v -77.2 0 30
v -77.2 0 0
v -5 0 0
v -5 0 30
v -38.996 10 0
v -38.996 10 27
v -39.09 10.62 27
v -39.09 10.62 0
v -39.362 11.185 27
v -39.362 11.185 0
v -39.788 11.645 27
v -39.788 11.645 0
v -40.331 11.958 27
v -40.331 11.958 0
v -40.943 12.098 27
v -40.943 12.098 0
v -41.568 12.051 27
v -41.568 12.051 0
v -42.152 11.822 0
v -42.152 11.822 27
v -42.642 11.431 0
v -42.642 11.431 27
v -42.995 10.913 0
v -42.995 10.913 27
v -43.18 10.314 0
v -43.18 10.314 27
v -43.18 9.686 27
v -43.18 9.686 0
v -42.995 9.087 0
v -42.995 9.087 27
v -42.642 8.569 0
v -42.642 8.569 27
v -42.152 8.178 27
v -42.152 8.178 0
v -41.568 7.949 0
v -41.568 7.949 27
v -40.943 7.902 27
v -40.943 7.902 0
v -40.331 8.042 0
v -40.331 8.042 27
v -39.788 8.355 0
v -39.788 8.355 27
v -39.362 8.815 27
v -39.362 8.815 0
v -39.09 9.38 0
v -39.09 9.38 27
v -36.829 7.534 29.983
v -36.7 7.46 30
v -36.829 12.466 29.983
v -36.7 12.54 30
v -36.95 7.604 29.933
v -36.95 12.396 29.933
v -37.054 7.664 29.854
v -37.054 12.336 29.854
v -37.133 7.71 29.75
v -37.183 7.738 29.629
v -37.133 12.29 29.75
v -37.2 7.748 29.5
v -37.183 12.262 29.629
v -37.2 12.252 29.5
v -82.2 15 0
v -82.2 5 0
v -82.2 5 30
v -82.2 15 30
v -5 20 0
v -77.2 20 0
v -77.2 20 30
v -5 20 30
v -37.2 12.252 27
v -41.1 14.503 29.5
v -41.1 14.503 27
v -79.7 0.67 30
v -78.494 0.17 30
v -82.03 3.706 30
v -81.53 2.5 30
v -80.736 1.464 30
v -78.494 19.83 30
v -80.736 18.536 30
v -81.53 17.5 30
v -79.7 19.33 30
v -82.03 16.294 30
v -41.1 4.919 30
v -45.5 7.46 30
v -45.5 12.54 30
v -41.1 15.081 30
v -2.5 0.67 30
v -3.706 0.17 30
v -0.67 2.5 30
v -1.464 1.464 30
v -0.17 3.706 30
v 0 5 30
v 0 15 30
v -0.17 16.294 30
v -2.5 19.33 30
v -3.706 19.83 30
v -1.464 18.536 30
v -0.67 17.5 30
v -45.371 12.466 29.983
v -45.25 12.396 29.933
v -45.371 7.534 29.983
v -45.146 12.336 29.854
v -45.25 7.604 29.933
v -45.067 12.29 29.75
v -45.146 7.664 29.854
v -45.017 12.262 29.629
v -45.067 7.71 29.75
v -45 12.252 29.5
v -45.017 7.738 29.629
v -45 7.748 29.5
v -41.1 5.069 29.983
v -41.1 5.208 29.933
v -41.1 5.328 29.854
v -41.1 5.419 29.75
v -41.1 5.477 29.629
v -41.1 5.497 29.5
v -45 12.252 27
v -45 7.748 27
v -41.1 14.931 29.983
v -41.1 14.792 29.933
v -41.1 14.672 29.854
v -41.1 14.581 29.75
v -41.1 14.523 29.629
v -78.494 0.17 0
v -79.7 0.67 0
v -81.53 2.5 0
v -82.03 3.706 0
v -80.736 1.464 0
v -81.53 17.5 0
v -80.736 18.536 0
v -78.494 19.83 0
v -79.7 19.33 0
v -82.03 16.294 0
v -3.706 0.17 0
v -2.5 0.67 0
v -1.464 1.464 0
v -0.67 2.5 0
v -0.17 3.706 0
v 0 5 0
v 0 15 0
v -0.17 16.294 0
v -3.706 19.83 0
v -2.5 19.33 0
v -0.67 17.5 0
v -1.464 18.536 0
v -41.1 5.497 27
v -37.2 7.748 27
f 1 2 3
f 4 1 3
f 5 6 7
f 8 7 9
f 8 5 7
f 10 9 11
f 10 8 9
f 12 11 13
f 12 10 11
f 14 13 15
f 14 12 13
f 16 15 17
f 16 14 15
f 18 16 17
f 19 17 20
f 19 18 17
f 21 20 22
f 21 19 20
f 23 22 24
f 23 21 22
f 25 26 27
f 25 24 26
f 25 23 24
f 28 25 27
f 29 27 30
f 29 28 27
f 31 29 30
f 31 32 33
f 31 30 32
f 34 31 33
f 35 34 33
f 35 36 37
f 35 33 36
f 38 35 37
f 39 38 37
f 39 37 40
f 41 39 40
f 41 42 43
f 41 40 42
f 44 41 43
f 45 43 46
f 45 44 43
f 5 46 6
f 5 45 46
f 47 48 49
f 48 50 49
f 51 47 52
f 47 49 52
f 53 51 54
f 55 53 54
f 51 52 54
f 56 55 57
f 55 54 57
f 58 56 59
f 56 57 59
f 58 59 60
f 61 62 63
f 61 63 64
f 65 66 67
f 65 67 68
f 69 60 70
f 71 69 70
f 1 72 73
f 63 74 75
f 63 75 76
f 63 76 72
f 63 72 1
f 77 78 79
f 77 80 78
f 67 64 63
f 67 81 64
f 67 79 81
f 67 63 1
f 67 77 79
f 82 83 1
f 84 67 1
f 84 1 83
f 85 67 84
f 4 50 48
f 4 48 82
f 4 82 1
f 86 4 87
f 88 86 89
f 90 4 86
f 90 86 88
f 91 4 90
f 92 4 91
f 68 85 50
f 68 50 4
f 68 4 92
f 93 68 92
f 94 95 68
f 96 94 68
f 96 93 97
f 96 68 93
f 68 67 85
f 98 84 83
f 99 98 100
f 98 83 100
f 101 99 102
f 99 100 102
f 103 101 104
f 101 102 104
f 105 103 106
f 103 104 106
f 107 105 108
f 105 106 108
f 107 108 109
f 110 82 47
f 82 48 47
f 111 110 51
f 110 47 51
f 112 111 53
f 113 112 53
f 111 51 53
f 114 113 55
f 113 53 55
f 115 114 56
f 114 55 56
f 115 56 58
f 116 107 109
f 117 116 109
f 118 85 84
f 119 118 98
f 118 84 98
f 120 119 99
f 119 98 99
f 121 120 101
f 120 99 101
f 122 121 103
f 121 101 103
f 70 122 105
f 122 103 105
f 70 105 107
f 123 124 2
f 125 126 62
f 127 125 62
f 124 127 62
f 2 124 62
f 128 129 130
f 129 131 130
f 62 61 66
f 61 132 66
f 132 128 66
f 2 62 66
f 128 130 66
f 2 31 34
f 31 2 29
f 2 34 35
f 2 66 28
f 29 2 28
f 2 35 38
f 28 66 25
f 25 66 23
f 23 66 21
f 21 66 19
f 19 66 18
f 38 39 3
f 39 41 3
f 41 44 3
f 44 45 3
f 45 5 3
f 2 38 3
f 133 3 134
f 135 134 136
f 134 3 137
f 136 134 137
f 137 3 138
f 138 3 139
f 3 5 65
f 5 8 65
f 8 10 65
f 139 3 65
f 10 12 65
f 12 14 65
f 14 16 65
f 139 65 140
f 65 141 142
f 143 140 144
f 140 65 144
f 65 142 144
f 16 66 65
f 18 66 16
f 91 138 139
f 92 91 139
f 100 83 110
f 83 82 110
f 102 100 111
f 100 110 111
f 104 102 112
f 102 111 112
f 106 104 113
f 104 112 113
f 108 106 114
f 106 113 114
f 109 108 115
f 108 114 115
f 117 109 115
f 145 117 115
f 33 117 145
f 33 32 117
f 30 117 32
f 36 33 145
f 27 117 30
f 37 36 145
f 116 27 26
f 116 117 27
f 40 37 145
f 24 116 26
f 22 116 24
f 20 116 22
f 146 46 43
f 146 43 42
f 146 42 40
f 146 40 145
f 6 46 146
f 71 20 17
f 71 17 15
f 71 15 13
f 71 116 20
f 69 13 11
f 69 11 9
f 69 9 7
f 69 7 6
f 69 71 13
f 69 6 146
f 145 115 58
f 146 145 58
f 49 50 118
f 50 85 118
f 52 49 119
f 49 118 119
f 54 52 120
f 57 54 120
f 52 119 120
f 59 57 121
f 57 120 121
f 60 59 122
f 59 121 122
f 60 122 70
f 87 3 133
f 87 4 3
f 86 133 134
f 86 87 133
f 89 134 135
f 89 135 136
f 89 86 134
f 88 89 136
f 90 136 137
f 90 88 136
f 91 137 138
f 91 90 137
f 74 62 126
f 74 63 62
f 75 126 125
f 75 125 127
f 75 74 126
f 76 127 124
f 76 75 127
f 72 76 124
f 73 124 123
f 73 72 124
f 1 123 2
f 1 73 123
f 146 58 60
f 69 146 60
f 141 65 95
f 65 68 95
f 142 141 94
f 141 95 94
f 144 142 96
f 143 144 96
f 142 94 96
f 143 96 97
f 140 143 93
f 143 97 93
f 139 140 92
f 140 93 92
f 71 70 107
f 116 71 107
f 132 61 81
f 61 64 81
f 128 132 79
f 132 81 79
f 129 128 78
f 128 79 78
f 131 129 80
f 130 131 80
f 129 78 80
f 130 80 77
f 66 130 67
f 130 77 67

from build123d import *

# Parameters (mm, degrees)
ESQUISSE1_W             = 82.2
ESQUISSE1_H             = 20
BOSS_EXTRU_1_DEPTH      = 30
ENL_V_MAT_EXTRU_1_DEPTH = 3
CONG_1_R                = 5
CONG_2_R                = 0.5
ESQUISSE8_R             = 2.103774153
ENL_V_MAT_EXTRU_3_DEPTH = 90.759901961


with BuildPart() as part:
    # Esquisse1 → Boss.-Extru.1 (new body)
    with BuildSketch(Plane.XY):
        with Locations((-41.1, 10)):
            Rectangle(ESQUISSE1_W, ESQUISSE1_H)
    extrude(amount=BOSS_EXTRU_1_DEPTH)

    # Esquisse2 → Enlèv. mat.-Extru.1 (cut)
    with BuildSketch(Plane.XY.offset(30)):
        Polygon((-41.1, 5.4966679), (-37.2, 7.74833395), (-37.2, 12.25166605), (-41.1, 14.5033321), (-45, 12.25166605), (-45, 7.74833395), align=None)
    extrude(amount=-ENL_V_MAT_EXTRU_1_DEPTH, mode=Mode.SUBTRACT)

    # Congé1
    cong_1_edges = [part.edges().sort_by_distance(p)[0] for p in [
        (0, 0, 15),
        (-82.2, 0, 15),
        (-82.2, 20, 15),
        (0, 20, 15),
    ]]
    fillet(cong_1_edges, radius=CONG_1_R)

    # Congé2
    cong_2_edges = [part.edges().sort_by_distance(p)[0] for p in [
        (-43.05, 6.622500925, 30),
        (-39.15, 6.622500925, 30),
        (-37.2, 10, 30),
        (-39.15, 13.377499075, 30),
        (-43.05, 13.377499075, 30),
        (-45, 10, 30),
    ]]
    fillet(cong_2_edges, radius=CONG_2_R)

    # Esquisse8 → Enlèv. mat.-Extru.3 (cut, through all)
    with BuildSketch(Plane.XY):
        with Locations((-41.1, 10)):
            Circle(ESQUISSE8_R)
    extrude(amount=ENL_V_MAT_EXTRU_3_DEPTH, mode=Mode.SUBTRACT)


solid = part.part
